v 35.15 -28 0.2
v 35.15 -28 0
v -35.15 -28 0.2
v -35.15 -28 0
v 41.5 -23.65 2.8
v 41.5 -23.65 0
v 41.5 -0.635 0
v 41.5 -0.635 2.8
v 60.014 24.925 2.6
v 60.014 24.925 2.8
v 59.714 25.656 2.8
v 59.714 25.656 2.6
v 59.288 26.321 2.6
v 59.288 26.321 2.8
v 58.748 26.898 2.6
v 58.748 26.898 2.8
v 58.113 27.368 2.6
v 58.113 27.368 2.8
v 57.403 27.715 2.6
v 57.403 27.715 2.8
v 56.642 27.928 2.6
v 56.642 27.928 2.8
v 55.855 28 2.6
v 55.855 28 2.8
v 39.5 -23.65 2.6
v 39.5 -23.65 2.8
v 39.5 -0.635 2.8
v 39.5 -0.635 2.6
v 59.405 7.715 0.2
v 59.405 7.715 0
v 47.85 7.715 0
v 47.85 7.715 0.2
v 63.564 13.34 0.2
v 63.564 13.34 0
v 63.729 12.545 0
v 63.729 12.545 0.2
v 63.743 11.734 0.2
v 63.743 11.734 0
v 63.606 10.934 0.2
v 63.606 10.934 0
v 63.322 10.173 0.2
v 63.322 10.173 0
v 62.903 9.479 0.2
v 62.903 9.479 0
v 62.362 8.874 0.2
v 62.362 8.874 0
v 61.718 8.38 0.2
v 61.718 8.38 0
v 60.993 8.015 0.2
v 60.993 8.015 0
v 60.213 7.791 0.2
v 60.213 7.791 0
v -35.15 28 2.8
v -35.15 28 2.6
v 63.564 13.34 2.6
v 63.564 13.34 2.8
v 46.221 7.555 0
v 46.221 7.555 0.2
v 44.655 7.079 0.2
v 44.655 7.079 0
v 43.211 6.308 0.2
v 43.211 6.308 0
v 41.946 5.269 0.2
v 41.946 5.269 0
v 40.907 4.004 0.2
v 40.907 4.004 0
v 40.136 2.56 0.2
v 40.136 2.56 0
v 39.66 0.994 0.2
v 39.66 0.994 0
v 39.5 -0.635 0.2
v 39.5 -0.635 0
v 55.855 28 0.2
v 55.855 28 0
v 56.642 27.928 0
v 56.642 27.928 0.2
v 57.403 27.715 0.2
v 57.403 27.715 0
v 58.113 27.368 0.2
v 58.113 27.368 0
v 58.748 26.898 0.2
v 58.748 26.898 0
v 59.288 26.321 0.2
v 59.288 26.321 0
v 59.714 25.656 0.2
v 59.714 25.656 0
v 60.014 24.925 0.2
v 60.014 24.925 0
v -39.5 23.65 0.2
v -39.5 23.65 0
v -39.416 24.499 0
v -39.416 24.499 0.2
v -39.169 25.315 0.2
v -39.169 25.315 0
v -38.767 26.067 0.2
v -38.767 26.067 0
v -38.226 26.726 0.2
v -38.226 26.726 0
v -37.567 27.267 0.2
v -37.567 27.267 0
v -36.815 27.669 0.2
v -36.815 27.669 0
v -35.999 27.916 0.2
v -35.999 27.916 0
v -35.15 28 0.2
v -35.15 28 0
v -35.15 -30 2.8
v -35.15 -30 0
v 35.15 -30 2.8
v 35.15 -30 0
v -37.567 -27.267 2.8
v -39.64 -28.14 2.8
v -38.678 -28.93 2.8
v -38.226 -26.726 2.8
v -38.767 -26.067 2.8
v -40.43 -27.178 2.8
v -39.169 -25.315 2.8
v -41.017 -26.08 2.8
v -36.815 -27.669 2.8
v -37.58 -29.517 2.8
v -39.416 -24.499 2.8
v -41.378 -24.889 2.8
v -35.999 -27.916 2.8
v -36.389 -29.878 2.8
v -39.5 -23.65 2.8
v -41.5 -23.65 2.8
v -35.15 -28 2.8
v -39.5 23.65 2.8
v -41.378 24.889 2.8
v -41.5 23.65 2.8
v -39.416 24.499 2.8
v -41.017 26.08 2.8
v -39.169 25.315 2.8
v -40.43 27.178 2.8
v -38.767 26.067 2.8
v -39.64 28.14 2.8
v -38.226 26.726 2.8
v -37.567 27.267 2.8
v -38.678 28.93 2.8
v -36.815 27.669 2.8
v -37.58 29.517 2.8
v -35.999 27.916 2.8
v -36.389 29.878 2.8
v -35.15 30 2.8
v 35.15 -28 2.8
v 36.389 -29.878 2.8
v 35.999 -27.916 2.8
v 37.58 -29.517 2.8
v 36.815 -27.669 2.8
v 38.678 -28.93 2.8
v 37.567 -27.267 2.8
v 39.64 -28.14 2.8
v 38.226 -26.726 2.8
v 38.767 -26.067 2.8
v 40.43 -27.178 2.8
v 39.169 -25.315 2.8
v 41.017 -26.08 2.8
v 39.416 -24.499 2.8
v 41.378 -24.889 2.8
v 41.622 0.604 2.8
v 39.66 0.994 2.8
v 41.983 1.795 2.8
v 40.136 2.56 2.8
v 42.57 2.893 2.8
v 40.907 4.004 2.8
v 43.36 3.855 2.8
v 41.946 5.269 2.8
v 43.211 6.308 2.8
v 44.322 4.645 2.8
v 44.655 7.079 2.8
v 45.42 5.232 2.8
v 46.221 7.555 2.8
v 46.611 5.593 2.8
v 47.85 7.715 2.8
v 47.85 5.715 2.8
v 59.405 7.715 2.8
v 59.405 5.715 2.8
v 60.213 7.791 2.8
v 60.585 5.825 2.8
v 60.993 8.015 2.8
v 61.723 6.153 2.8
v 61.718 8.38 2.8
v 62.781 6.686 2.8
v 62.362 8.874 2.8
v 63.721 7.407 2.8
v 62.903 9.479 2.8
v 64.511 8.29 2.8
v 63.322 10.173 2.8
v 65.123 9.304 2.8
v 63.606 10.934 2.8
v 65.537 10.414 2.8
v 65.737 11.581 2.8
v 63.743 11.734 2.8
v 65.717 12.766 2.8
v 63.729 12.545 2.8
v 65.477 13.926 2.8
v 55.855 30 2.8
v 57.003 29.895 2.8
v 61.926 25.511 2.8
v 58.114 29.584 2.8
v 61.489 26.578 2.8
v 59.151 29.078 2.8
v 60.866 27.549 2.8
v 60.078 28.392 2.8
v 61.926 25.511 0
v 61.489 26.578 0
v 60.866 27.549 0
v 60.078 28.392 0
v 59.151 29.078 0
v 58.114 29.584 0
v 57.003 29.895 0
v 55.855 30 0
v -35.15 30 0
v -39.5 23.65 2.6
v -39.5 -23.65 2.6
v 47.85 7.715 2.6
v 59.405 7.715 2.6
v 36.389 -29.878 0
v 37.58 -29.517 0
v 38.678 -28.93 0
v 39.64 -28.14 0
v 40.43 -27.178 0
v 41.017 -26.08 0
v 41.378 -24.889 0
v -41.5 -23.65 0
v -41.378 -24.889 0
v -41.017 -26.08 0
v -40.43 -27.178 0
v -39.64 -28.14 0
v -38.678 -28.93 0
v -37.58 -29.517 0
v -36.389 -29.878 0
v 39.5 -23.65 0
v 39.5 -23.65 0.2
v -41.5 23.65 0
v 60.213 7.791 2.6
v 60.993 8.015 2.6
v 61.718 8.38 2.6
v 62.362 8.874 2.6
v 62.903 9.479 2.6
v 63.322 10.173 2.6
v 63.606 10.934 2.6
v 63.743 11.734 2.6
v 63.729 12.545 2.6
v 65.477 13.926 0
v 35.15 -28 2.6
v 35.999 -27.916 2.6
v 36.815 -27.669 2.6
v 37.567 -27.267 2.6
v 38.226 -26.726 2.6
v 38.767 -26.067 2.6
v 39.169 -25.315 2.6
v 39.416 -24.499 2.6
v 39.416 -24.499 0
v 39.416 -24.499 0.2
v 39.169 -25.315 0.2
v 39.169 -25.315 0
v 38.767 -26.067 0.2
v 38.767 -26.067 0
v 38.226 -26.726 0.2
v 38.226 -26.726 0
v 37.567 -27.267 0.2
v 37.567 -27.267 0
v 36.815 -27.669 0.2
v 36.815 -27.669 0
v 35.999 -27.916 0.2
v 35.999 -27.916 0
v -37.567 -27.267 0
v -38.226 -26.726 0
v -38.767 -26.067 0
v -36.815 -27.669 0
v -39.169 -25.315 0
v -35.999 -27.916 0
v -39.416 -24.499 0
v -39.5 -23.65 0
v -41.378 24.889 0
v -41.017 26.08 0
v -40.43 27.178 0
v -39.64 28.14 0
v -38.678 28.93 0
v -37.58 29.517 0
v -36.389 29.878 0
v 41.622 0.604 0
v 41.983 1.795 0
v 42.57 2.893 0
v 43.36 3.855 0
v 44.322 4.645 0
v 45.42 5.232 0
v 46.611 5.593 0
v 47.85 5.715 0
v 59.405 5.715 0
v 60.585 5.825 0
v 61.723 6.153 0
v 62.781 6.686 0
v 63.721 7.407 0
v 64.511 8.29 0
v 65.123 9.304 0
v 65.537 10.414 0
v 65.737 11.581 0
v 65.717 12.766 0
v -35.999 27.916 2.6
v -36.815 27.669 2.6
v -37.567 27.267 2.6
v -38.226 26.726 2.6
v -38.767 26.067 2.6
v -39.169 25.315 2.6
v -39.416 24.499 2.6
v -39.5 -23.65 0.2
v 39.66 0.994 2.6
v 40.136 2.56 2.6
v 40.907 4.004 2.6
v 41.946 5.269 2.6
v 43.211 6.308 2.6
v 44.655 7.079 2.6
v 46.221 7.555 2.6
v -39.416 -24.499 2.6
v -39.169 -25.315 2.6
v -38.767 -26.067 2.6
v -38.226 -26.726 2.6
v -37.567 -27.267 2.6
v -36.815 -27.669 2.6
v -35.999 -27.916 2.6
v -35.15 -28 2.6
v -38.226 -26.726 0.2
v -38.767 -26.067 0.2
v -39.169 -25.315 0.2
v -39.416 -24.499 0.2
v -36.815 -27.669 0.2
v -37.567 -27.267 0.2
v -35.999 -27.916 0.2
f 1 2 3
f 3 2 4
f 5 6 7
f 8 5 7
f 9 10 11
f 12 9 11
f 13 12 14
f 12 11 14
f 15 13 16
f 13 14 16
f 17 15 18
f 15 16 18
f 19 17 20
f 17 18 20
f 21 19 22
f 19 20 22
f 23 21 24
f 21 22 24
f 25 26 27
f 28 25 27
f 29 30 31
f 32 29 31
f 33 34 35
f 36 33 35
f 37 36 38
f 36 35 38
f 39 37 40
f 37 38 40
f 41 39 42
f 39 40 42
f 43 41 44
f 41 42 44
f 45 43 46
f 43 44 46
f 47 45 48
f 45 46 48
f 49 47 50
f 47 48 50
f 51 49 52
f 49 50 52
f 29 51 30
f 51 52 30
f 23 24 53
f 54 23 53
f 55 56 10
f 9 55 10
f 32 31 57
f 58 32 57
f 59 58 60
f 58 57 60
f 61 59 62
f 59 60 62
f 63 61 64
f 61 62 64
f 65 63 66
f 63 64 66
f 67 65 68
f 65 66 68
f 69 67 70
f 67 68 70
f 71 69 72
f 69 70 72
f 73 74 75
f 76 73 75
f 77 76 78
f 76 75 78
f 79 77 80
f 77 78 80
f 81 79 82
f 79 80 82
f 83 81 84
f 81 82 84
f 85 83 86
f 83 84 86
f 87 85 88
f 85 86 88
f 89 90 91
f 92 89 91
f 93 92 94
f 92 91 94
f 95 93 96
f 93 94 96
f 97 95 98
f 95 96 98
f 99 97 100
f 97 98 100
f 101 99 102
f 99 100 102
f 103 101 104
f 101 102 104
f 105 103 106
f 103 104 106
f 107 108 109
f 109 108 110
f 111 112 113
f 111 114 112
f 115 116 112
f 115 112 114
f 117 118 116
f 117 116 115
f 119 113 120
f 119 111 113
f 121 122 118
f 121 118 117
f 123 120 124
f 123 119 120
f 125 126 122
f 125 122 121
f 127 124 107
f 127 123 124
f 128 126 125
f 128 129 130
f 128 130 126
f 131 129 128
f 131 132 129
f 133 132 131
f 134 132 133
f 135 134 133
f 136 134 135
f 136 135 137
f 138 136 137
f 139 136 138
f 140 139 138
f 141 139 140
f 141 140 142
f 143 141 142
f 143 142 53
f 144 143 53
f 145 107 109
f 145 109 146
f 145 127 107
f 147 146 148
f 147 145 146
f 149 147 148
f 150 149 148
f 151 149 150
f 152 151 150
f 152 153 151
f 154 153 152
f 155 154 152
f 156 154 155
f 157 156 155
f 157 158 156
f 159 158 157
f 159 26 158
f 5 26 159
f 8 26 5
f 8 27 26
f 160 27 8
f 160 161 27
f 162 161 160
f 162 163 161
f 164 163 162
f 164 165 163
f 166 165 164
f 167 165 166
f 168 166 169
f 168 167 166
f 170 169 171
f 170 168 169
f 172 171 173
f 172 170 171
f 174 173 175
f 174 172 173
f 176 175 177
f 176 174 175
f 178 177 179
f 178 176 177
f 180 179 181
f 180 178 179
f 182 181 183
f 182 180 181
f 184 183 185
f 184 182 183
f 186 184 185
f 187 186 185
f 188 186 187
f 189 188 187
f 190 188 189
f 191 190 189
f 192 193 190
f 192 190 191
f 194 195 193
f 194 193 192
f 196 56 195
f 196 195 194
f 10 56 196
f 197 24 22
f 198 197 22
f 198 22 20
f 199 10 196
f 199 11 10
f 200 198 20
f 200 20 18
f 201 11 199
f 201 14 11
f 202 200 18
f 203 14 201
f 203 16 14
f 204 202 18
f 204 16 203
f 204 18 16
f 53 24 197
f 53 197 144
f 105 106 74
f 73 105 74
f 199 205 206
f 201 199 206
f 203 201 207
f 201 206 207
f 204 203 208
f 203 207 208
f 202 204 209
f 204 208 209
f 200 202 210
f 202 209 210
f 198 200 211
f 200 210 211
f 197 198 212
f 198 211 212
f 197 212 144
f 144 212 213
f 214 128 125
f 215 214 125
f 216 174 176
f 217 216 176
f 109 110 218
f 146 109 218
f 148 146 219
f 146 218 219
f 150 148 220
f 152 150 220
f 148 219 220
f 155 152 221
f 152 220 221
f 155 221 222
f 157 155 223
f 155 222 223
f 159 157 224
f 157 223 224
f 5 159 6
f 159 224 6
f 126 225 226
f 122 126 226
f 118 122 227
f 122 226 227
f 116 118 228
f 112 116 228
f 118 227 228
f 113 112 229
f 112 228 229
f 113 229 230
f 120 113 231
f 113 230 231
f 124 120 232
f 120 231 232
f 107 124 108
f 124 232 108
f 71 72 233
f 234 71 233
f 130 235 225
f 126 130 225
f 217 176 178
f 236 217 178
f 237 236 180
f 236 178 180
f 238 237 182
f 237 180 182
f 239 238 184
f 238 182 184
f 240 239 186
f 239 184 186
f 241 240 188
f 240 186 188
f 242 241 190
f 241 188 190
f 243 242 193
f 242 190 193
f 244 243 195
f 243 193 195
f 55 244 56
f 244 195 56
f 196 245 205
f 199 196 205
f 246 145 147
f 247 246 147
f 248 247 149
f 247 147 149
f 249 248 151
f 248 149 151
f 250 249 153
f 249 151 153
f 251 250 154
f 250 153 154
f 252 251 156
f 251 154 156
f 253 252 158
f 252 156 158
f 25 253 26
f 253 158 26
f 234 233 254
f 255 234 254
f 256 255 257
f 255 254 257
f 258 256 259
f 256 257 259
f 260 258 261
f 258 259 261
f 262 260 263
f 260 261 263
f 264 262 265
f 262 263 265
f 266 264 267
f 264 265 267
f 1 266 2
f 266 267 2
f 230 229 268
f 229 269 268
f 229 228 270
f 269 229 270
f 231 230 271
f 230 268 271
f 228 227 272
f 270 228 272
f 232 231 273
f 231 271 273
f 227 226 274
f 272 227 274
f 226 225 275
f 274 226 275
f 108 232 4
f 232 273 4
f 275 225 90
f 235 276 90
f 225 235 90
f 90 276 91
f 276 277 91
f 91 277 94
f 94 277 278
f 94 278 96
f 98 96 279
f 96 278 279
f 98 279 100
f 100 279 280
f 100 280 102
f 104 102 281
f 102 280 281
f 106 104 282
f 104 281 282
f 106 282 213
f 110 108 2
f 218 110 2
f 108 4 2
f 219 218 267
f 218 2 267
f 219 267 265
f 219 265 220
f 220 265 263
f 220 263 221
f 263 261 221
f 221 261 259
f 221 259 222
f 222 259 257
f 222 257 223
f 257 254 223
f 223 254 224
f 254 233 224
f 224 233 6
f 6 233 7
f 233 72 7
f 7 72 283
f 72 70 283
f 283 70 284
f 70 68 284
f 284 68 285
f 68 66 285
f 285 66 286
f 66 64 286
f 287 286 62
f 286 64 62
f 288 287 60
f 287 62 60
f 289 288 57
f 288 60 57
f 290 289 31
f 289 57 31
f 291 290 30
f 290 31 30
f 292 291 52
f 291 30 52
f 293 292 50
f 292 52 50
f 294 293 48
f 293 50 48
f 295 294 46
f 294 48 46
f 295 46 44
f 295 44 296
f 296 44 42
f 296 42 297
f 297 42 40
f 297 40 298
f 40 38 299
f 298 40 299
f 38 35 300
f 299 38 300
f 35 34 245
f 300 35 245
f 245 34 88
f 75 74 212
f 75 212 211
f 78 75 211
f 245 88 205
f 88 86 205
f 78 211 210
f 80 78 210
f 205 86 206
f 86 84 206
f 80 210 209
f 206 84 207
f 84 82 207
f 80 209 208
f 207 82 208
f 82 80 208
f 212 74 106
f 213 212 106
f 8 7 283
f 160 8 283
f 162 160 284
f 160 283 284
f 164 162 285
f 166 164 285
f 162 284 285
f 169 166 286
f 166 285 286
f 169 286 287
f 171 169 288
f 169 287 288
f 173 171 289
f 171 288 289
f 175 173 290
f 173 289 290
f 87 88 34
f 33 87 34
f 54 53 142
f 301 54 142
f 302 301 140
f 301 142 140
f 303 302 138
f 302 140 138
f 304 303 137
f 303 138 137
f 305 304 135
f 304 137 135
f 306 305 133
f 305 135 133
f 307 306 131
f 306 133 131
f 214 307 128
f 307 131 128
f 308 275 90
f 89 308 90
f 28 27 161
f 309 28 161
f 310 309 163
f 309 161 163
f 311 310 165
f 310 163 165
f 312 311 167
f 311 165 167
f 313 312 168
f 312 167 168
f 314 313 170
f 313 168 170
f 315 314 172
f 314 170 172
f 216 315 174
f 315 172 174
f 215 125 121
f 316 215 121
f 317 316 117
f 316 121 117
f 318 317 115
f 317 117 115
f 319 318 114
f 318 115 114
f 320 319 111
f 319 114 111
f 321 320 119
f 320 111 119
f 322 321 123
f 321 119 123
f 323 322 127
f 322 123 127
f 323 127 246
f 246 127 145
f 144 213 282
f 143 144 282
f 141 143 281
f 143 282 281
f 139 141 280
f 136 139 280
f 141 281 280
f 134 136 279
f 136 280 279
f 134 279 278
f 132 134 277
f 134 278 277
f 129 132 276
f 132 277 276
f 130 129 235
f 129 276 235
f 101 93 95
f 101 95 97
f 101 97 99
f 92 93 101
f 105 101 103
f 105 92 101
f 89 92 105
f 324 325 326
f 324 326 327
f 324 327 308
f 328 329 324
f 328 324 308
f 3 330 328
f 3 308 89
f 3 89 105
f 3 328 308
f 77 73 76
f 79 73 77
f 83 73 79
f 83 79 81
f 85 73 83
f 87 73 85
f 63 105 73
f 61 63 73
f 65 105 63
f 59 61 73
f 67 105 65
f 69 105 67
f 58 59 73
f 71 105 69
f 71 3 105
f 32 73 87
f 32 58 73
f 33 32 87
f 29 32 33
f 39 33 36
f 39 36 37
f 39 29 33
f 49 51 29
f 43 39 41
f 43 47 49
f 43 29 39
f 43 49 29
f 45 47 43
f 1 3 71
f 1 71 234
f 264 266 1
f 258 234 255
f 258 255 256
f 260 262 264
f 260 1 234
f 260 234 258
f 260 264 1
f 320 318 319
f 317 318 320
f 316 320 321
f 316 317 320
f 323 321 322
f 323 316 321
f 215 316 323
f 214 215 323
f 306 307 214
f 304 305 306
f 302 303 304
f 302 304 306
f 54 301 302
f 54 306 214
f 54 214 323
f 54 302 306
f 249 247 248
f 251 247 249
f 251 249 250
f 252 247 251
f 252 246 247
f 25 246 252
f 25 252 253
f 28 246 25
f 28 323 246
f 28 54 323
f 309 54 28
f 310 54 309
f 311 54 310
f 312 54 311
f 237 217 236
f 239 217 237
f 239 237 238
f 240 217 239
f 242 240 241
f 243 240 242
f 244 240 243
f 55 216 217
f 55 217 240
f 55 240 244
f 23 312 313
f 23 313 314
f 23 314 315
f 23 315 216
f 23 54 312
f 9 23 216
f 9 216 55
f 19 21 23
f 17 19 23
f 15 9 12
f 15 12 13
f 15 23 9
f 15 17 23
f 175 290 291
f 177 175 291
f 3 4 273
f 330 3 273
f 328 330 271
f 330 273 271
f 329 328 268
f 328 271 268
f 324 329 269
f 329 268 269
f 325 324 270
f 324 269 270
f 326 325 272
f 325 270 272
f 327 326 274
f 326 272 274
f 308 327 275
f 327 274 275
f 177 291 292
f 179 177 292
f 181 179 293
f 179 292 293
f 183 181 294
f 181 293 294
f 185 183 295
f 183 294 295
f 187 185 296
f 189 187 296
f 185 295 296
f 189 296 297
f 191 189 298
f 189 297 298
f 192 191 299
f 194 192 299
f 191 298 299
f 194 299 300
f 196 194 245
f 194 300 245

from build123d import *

# Parameters (mm, degrees)
F1_DEPTH = 2.8
F3_DEPTH = 0.2
F5_DEPTH = 0.2


with BuildPart() as f1:
    # F0 (on Top) → F1 (new body)
    with BuildSketch(Plane.XY):
        with BuildLine():
            ThreePointArc((-41.5, -23.65), (-39.640128, -28.140128), (-35.15, -30))
            Line((-35.15, -30), (35.15, -30))
            ThreePointArc((35.15, -30), (39.640128, -28.140128), (41.5, -23.65))
            Line((41.5, -23.65), (41.5, -0.635))
            ThreePointArc((41.5, -0.635), (43.359872, 3.855128), (47.85, 5.715))
            Line((47.85, 5.715), (59.405295, 5.715))
            ThreePointArc((59.405295, 5.715), (64.511092, 8.28964), (65.476545, 13.925759))
            Line((65.476545, 13.925759), (61.925894, 25.510759))
            ThreePointArc((61.925894, 25.510759), (59.630003, 28.755797), (55.854644, 30))
            Line((55.854644, 30), (41.5, 30))
            Line((41.5, 30), (-35.15, 30))
            ThreePointArc((-35.15, 30), (-39.640128, 28.140128), (-41.5, 23.65))
            Line((-41.5, 23.65), (-41.5, -23.65))
        make_face()
    extrude(amount=F1_DEPTH)

    # F2 (on face) → F3 (cut)
    with BuildSketch(Plane.XY.offset(2.8)):
        with BuildLine():
            ThreePointArc((39.5, -0.635), (41.945658, 5.269342), (47.85, 7.715))
            Line((47.85, 7.715), (59.405295, 7.715))
            ThreePointArc((59.405295, 7.715), (62.902967, 9.47873), (63.56434, 13.339693))
            Line((63.56434, 13.339693), (60.013689, 24.924693))
            ThreePointArc((60.013689, 24.924693), (58.440914, 27.147672), (55.854644, 28))
            Line((55.854644, 28), (-35.15, 28))
            ThreePointArc((-35.15, 28), (-38.225914, 26.725914), (-39.5, 23.65))
            Line((-39.5, 23.65), (-39.5, -23.65))
            ThreePointArc((-39.5, -23.65), (-38.225914, -26.725914), (-35.15, -28))
            Line((-35.15, -28), (35.15, -28))
            ThreePointArc((35.15, -28), (38.225914, -26.725914), (39.5, -23.65))
            Line((39.5, -23.65), (39.5, -0.635))
        make_face()
    extrude(amount=-F3_DEPTH, mode=Mode.SUBTRACT)

    # F4 (on face) → F5 (cut)
    with BuildSketch(Plane(origin=(0, 0, 0), x_dir=(1, 0, 0), z_dir=(0, 0, -1))):
        with BuildLine():
            ThreePointArc((-39.5, -23.65), (-38.225914, -26.725914), (-35.15, -28))
            Line((-35.15, -28), (55.854644, -28))
            ThreePointArc((55.854644, -28), (58.440914, -27.147672), (60.013689, -24.924693))
            Line((60.013689, -24.924693), (63.56434, -13.339693))
            ThreePointArc((63.56434, -13.339693), (62.902967, -9.47873), (59.405295, -7.715))
            Line((59.405295, -7.715), (47.85, -7.715))
            ThreePointArc((47.85, -7.715), (41.945658, -5.269342), (39.5, 0.635))
            Line((39.5, 0.635), (39.5, 23.65))
            ThreePointArc((39.5, 23.65), (38.225914, 26.725914), (35.15, 28))
            Line((35.15, 28), (-35.15, 28))
            ThreePointArc((-35.15, 28), (-38.225914, 26.725914), (-39.5, 23.65))
            Line((-39.5, 23.65), (-39.5, -23.65))
        make_face()
    extrude(amount=-F5_DEPTH, mode=Mode.SUBTRACT)


solid = f1.part
